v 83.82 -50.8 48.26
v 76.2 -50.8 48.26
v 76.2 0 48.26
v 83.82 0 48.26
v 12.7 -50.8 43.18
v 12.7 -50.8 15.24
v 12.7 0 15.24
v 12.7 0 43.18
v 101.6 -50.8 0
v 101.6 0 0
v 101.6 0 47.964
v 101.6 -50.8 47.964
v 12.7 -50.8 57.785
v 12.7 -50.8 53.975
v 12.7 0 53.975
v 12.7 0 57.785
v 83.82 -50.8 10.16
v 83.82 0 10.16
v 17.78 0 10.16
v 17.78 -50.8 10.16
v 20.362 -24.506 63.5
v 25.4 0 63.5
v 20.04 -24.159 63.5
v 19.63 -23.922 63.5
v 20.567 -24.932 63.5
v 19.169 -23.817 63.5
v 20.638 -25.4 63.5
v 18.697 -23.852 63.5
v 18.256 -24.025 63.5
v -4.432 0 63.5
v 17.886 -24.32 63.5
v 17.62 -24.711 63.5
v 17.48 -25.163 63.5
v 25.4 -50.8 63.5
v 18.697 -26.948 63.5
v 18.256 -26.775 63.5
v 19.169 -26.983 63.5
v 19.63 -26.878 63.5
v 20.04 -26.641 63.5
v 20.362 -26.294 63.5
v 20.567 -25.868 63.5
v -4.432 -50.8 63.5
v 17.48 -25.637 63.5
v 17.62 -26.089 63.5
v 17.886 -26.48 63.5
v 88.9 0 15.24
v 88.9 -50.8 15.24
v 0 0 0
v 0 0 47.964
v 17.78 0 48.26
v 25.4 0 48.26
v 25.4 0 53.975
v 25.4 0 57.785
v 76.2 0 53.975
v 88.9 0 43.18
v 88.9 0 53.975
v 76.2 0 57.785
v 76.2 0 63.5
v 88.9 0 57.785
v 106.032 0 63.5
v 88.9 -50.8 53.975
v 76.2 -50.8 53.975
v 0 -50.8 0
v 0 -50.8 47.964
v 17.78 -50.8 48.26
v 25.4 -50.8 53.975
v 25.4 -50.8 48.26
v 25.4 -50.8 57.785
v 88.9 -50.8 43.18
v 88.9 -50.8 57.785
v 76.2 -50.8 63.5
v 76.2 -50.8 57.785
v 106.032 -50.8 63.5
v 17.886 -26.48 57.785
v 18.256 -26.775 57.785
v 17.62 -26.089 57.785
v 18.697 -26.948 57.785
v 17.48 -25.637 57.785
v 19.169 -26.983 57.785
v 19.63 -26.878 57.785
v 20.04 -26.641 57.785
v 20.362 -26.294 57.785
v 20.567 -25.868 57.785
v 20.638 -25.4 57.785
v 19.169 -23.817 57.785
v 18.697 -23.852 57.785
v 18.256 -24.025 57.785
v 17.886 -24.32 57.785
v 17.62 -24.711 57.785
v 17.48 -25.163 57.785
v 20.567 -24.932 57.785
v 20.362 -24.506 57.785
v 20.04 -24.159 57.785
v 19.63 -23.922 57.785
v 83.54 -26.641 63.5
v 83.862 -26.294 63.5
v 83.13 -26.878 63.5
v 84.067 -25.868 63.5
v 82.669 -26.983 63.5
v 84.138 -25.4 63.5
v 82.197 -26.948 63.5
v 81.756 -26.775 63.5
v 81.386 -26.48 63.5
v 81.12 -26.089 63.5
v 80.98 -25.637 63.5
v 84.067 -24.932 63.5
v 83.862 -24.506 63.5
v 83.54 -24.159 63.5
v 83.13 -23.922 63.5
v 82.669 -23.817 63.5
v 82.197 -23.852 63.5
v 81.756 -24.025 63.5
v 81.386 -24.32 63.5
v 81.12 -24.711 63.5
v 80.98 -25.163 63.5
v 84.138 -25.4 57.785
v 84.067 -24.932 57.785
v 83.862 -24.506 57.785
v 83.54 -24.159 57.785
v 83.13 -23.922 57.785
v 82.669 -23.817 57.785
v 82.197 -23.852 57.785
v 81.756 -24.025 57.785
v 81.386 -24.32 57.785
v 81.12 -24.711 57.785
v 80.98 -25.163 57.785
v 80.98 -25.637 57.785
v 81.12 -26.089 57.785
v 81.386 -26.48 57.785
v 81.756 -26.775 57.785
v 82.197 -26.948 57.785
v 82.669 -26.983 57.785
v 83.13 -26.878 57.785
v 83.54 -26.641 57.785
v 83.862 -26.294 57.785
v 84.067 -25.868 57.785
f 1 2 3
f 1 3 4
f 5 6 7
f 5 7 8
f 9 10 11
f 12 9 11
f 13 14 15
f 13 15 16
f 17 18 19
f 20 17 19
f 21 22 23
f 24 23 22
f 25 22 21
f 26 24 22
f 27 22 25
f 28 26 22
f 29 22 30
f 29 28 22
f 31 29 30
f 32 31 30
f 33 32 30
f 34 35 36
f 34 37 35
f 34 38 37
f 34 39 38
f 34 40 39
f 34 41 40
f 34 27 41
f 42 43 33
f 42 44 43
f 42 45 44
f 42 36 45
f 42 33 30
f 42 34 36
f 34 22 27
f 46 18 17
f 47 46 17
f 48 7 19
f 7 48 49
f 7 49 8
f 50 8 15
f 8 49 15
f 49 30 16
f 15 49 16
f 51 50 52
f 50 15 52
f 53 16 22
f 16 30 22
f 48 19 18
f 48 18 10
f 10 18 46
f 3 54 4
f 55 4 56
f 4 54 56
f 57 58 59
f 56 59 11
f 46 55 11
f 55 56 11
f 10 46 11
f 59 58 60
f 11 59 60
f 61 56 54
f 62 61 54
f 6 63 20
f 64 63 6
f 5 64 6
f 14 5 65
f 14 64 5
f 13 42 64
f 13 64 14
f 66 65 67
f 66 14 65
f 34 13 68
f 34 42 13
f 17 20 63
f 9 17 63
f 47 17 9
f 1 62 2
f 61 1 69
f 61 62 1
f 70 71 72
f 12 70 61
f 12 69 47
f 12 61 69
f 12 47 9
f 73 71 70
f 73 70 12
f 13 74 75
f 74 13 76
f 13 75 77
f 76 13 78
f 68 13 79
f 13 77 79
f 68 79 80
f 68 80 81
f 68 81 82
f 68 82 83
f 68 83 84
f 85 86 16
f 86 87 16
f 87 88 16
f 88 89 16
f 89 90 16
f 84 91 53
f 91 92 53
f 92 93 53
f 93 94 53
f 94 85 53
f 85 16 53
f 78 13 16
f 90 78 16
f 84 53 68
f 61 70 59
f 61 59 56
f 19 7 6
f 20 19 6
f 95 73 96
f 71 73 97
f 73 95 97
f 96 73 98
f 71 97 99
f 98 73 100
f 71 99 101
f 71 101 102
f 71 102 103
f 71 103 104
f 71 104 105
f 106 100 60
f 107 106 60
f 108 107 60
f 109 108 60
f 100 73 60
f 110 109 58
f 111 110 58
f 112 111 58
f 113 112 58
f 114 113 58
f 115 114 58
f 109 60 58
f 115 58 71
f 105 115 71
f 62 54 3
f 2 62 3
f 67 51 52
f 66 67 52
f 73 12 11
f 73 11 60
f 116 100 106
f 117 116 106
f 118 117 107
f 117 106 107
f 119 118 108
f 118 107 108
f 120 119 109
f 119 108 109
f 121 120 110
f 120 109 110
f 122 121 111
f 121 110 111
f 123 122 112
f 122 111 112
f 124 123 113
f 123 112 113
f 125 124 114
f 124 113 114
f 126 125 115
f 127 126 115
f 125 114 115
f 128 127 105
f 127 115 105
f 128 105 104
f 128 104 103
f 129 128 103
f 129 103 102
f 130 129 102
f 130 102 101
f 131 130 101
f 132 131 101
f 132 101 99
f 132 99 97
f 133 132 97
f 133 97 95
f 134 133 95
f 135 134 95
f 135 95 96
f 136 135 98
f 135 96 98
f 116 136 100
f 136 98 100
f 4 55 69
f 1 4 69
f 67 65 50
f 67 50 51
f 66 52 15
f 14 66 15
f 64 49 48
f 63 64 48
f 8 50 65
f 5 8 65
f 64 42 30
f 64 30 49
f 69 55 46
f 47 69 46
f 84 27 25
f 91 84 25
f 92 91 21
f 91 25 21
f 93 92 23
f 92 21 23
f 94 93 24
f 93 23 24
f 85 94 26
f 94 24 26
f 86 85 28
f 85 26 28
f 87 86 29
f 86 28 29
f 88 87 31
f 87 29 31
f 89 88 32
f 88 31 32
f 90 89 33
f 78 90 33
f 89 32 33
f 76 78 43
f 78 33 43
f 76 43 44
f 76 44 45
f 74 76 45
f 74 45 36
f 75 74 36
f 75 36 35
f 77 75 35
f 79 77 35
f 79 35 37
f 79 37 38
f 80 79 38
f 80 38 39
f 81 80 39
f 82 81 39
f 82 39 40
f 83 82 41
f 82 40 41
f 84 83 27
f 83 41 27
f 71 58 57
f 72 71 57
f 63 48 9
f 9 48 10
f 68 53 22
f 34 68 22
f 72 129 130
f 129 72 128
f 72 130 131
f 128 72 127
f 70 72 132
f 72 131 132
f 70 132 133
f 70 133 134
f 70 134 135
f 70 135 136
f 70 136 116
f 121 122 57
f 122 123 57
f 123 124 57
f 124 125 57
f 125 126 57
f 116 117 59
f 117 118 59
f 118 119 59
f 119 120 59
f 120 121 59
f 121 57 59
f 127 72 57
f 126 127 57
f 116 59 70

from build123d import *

# Parameters (mm, degrees)
F1_DEPTH = 50.8
F2_R     = 1.5875
F3_DEPTH = 5.715
F4_SIZE  = 5.08
F6_DEPTH = 50.8


with BuildPart() as f1:
    # F0 (on Front) → F1 (new body)
    with BuildSketch(Plane.XZ):
        Polygon((25.4, 57.785), (25.4, 63.5), (0, 63.5), (0, 0), (50.8, 0), (101.6, 0), (101.6, 63.5), (76.2, 63.5), (76.2, 57.785), (88.9, 57.785), (88.9, 53.975), (76.2, 53.975), (76.2, 48.26), (88.9, 48.26), (88.9, 10.16), (50.8, 10.16), (12.7, 10.16), (12.7, 48.26), (25.4, 48.26), (25.4, 53.975), (12.7, 53.975), (12.7, 57.785), align=None)
    extrude(amount=F1_DEPTH)

    # F2 (on face) → F3 (cut, through all)
    with BuildSketch(Plane.XY.offset(63.5)):
        with Locations((19.05, -25.4)):
            Circle(F2_R)
        with Locations((82.55, -25.4)):
            Circle(F2_R)
    extrude(amount=-F3_DEPTH, mode=Mode.SUBTRACT)

    # F4
    f4_edges = [f1.edges().sort_by_distance(p)[0] for p in [
        (12.7, -25.4, 10.16),
        (88.9, -25.4, 10.16),
        (12.7, -25.4, 48.26),
        (88.9, -25.4, 48.26),
    ]]
    chamfer(f4_edges, length=F4_SIZE)

    # F5 (on face) → F6 (join)
    with BuildSketch(Plane.XZ.offset(50.8)):
        Polygon((0, 47.963981), (0, 63.5), (-4.432204, 63.5), align=None)
        Polygon((101.6, 63.5), (101.6, 47.963981), (106.032204, 63.5), align=None)
    extrude(amount=-F6_DEPTH)


solid = f1.part
